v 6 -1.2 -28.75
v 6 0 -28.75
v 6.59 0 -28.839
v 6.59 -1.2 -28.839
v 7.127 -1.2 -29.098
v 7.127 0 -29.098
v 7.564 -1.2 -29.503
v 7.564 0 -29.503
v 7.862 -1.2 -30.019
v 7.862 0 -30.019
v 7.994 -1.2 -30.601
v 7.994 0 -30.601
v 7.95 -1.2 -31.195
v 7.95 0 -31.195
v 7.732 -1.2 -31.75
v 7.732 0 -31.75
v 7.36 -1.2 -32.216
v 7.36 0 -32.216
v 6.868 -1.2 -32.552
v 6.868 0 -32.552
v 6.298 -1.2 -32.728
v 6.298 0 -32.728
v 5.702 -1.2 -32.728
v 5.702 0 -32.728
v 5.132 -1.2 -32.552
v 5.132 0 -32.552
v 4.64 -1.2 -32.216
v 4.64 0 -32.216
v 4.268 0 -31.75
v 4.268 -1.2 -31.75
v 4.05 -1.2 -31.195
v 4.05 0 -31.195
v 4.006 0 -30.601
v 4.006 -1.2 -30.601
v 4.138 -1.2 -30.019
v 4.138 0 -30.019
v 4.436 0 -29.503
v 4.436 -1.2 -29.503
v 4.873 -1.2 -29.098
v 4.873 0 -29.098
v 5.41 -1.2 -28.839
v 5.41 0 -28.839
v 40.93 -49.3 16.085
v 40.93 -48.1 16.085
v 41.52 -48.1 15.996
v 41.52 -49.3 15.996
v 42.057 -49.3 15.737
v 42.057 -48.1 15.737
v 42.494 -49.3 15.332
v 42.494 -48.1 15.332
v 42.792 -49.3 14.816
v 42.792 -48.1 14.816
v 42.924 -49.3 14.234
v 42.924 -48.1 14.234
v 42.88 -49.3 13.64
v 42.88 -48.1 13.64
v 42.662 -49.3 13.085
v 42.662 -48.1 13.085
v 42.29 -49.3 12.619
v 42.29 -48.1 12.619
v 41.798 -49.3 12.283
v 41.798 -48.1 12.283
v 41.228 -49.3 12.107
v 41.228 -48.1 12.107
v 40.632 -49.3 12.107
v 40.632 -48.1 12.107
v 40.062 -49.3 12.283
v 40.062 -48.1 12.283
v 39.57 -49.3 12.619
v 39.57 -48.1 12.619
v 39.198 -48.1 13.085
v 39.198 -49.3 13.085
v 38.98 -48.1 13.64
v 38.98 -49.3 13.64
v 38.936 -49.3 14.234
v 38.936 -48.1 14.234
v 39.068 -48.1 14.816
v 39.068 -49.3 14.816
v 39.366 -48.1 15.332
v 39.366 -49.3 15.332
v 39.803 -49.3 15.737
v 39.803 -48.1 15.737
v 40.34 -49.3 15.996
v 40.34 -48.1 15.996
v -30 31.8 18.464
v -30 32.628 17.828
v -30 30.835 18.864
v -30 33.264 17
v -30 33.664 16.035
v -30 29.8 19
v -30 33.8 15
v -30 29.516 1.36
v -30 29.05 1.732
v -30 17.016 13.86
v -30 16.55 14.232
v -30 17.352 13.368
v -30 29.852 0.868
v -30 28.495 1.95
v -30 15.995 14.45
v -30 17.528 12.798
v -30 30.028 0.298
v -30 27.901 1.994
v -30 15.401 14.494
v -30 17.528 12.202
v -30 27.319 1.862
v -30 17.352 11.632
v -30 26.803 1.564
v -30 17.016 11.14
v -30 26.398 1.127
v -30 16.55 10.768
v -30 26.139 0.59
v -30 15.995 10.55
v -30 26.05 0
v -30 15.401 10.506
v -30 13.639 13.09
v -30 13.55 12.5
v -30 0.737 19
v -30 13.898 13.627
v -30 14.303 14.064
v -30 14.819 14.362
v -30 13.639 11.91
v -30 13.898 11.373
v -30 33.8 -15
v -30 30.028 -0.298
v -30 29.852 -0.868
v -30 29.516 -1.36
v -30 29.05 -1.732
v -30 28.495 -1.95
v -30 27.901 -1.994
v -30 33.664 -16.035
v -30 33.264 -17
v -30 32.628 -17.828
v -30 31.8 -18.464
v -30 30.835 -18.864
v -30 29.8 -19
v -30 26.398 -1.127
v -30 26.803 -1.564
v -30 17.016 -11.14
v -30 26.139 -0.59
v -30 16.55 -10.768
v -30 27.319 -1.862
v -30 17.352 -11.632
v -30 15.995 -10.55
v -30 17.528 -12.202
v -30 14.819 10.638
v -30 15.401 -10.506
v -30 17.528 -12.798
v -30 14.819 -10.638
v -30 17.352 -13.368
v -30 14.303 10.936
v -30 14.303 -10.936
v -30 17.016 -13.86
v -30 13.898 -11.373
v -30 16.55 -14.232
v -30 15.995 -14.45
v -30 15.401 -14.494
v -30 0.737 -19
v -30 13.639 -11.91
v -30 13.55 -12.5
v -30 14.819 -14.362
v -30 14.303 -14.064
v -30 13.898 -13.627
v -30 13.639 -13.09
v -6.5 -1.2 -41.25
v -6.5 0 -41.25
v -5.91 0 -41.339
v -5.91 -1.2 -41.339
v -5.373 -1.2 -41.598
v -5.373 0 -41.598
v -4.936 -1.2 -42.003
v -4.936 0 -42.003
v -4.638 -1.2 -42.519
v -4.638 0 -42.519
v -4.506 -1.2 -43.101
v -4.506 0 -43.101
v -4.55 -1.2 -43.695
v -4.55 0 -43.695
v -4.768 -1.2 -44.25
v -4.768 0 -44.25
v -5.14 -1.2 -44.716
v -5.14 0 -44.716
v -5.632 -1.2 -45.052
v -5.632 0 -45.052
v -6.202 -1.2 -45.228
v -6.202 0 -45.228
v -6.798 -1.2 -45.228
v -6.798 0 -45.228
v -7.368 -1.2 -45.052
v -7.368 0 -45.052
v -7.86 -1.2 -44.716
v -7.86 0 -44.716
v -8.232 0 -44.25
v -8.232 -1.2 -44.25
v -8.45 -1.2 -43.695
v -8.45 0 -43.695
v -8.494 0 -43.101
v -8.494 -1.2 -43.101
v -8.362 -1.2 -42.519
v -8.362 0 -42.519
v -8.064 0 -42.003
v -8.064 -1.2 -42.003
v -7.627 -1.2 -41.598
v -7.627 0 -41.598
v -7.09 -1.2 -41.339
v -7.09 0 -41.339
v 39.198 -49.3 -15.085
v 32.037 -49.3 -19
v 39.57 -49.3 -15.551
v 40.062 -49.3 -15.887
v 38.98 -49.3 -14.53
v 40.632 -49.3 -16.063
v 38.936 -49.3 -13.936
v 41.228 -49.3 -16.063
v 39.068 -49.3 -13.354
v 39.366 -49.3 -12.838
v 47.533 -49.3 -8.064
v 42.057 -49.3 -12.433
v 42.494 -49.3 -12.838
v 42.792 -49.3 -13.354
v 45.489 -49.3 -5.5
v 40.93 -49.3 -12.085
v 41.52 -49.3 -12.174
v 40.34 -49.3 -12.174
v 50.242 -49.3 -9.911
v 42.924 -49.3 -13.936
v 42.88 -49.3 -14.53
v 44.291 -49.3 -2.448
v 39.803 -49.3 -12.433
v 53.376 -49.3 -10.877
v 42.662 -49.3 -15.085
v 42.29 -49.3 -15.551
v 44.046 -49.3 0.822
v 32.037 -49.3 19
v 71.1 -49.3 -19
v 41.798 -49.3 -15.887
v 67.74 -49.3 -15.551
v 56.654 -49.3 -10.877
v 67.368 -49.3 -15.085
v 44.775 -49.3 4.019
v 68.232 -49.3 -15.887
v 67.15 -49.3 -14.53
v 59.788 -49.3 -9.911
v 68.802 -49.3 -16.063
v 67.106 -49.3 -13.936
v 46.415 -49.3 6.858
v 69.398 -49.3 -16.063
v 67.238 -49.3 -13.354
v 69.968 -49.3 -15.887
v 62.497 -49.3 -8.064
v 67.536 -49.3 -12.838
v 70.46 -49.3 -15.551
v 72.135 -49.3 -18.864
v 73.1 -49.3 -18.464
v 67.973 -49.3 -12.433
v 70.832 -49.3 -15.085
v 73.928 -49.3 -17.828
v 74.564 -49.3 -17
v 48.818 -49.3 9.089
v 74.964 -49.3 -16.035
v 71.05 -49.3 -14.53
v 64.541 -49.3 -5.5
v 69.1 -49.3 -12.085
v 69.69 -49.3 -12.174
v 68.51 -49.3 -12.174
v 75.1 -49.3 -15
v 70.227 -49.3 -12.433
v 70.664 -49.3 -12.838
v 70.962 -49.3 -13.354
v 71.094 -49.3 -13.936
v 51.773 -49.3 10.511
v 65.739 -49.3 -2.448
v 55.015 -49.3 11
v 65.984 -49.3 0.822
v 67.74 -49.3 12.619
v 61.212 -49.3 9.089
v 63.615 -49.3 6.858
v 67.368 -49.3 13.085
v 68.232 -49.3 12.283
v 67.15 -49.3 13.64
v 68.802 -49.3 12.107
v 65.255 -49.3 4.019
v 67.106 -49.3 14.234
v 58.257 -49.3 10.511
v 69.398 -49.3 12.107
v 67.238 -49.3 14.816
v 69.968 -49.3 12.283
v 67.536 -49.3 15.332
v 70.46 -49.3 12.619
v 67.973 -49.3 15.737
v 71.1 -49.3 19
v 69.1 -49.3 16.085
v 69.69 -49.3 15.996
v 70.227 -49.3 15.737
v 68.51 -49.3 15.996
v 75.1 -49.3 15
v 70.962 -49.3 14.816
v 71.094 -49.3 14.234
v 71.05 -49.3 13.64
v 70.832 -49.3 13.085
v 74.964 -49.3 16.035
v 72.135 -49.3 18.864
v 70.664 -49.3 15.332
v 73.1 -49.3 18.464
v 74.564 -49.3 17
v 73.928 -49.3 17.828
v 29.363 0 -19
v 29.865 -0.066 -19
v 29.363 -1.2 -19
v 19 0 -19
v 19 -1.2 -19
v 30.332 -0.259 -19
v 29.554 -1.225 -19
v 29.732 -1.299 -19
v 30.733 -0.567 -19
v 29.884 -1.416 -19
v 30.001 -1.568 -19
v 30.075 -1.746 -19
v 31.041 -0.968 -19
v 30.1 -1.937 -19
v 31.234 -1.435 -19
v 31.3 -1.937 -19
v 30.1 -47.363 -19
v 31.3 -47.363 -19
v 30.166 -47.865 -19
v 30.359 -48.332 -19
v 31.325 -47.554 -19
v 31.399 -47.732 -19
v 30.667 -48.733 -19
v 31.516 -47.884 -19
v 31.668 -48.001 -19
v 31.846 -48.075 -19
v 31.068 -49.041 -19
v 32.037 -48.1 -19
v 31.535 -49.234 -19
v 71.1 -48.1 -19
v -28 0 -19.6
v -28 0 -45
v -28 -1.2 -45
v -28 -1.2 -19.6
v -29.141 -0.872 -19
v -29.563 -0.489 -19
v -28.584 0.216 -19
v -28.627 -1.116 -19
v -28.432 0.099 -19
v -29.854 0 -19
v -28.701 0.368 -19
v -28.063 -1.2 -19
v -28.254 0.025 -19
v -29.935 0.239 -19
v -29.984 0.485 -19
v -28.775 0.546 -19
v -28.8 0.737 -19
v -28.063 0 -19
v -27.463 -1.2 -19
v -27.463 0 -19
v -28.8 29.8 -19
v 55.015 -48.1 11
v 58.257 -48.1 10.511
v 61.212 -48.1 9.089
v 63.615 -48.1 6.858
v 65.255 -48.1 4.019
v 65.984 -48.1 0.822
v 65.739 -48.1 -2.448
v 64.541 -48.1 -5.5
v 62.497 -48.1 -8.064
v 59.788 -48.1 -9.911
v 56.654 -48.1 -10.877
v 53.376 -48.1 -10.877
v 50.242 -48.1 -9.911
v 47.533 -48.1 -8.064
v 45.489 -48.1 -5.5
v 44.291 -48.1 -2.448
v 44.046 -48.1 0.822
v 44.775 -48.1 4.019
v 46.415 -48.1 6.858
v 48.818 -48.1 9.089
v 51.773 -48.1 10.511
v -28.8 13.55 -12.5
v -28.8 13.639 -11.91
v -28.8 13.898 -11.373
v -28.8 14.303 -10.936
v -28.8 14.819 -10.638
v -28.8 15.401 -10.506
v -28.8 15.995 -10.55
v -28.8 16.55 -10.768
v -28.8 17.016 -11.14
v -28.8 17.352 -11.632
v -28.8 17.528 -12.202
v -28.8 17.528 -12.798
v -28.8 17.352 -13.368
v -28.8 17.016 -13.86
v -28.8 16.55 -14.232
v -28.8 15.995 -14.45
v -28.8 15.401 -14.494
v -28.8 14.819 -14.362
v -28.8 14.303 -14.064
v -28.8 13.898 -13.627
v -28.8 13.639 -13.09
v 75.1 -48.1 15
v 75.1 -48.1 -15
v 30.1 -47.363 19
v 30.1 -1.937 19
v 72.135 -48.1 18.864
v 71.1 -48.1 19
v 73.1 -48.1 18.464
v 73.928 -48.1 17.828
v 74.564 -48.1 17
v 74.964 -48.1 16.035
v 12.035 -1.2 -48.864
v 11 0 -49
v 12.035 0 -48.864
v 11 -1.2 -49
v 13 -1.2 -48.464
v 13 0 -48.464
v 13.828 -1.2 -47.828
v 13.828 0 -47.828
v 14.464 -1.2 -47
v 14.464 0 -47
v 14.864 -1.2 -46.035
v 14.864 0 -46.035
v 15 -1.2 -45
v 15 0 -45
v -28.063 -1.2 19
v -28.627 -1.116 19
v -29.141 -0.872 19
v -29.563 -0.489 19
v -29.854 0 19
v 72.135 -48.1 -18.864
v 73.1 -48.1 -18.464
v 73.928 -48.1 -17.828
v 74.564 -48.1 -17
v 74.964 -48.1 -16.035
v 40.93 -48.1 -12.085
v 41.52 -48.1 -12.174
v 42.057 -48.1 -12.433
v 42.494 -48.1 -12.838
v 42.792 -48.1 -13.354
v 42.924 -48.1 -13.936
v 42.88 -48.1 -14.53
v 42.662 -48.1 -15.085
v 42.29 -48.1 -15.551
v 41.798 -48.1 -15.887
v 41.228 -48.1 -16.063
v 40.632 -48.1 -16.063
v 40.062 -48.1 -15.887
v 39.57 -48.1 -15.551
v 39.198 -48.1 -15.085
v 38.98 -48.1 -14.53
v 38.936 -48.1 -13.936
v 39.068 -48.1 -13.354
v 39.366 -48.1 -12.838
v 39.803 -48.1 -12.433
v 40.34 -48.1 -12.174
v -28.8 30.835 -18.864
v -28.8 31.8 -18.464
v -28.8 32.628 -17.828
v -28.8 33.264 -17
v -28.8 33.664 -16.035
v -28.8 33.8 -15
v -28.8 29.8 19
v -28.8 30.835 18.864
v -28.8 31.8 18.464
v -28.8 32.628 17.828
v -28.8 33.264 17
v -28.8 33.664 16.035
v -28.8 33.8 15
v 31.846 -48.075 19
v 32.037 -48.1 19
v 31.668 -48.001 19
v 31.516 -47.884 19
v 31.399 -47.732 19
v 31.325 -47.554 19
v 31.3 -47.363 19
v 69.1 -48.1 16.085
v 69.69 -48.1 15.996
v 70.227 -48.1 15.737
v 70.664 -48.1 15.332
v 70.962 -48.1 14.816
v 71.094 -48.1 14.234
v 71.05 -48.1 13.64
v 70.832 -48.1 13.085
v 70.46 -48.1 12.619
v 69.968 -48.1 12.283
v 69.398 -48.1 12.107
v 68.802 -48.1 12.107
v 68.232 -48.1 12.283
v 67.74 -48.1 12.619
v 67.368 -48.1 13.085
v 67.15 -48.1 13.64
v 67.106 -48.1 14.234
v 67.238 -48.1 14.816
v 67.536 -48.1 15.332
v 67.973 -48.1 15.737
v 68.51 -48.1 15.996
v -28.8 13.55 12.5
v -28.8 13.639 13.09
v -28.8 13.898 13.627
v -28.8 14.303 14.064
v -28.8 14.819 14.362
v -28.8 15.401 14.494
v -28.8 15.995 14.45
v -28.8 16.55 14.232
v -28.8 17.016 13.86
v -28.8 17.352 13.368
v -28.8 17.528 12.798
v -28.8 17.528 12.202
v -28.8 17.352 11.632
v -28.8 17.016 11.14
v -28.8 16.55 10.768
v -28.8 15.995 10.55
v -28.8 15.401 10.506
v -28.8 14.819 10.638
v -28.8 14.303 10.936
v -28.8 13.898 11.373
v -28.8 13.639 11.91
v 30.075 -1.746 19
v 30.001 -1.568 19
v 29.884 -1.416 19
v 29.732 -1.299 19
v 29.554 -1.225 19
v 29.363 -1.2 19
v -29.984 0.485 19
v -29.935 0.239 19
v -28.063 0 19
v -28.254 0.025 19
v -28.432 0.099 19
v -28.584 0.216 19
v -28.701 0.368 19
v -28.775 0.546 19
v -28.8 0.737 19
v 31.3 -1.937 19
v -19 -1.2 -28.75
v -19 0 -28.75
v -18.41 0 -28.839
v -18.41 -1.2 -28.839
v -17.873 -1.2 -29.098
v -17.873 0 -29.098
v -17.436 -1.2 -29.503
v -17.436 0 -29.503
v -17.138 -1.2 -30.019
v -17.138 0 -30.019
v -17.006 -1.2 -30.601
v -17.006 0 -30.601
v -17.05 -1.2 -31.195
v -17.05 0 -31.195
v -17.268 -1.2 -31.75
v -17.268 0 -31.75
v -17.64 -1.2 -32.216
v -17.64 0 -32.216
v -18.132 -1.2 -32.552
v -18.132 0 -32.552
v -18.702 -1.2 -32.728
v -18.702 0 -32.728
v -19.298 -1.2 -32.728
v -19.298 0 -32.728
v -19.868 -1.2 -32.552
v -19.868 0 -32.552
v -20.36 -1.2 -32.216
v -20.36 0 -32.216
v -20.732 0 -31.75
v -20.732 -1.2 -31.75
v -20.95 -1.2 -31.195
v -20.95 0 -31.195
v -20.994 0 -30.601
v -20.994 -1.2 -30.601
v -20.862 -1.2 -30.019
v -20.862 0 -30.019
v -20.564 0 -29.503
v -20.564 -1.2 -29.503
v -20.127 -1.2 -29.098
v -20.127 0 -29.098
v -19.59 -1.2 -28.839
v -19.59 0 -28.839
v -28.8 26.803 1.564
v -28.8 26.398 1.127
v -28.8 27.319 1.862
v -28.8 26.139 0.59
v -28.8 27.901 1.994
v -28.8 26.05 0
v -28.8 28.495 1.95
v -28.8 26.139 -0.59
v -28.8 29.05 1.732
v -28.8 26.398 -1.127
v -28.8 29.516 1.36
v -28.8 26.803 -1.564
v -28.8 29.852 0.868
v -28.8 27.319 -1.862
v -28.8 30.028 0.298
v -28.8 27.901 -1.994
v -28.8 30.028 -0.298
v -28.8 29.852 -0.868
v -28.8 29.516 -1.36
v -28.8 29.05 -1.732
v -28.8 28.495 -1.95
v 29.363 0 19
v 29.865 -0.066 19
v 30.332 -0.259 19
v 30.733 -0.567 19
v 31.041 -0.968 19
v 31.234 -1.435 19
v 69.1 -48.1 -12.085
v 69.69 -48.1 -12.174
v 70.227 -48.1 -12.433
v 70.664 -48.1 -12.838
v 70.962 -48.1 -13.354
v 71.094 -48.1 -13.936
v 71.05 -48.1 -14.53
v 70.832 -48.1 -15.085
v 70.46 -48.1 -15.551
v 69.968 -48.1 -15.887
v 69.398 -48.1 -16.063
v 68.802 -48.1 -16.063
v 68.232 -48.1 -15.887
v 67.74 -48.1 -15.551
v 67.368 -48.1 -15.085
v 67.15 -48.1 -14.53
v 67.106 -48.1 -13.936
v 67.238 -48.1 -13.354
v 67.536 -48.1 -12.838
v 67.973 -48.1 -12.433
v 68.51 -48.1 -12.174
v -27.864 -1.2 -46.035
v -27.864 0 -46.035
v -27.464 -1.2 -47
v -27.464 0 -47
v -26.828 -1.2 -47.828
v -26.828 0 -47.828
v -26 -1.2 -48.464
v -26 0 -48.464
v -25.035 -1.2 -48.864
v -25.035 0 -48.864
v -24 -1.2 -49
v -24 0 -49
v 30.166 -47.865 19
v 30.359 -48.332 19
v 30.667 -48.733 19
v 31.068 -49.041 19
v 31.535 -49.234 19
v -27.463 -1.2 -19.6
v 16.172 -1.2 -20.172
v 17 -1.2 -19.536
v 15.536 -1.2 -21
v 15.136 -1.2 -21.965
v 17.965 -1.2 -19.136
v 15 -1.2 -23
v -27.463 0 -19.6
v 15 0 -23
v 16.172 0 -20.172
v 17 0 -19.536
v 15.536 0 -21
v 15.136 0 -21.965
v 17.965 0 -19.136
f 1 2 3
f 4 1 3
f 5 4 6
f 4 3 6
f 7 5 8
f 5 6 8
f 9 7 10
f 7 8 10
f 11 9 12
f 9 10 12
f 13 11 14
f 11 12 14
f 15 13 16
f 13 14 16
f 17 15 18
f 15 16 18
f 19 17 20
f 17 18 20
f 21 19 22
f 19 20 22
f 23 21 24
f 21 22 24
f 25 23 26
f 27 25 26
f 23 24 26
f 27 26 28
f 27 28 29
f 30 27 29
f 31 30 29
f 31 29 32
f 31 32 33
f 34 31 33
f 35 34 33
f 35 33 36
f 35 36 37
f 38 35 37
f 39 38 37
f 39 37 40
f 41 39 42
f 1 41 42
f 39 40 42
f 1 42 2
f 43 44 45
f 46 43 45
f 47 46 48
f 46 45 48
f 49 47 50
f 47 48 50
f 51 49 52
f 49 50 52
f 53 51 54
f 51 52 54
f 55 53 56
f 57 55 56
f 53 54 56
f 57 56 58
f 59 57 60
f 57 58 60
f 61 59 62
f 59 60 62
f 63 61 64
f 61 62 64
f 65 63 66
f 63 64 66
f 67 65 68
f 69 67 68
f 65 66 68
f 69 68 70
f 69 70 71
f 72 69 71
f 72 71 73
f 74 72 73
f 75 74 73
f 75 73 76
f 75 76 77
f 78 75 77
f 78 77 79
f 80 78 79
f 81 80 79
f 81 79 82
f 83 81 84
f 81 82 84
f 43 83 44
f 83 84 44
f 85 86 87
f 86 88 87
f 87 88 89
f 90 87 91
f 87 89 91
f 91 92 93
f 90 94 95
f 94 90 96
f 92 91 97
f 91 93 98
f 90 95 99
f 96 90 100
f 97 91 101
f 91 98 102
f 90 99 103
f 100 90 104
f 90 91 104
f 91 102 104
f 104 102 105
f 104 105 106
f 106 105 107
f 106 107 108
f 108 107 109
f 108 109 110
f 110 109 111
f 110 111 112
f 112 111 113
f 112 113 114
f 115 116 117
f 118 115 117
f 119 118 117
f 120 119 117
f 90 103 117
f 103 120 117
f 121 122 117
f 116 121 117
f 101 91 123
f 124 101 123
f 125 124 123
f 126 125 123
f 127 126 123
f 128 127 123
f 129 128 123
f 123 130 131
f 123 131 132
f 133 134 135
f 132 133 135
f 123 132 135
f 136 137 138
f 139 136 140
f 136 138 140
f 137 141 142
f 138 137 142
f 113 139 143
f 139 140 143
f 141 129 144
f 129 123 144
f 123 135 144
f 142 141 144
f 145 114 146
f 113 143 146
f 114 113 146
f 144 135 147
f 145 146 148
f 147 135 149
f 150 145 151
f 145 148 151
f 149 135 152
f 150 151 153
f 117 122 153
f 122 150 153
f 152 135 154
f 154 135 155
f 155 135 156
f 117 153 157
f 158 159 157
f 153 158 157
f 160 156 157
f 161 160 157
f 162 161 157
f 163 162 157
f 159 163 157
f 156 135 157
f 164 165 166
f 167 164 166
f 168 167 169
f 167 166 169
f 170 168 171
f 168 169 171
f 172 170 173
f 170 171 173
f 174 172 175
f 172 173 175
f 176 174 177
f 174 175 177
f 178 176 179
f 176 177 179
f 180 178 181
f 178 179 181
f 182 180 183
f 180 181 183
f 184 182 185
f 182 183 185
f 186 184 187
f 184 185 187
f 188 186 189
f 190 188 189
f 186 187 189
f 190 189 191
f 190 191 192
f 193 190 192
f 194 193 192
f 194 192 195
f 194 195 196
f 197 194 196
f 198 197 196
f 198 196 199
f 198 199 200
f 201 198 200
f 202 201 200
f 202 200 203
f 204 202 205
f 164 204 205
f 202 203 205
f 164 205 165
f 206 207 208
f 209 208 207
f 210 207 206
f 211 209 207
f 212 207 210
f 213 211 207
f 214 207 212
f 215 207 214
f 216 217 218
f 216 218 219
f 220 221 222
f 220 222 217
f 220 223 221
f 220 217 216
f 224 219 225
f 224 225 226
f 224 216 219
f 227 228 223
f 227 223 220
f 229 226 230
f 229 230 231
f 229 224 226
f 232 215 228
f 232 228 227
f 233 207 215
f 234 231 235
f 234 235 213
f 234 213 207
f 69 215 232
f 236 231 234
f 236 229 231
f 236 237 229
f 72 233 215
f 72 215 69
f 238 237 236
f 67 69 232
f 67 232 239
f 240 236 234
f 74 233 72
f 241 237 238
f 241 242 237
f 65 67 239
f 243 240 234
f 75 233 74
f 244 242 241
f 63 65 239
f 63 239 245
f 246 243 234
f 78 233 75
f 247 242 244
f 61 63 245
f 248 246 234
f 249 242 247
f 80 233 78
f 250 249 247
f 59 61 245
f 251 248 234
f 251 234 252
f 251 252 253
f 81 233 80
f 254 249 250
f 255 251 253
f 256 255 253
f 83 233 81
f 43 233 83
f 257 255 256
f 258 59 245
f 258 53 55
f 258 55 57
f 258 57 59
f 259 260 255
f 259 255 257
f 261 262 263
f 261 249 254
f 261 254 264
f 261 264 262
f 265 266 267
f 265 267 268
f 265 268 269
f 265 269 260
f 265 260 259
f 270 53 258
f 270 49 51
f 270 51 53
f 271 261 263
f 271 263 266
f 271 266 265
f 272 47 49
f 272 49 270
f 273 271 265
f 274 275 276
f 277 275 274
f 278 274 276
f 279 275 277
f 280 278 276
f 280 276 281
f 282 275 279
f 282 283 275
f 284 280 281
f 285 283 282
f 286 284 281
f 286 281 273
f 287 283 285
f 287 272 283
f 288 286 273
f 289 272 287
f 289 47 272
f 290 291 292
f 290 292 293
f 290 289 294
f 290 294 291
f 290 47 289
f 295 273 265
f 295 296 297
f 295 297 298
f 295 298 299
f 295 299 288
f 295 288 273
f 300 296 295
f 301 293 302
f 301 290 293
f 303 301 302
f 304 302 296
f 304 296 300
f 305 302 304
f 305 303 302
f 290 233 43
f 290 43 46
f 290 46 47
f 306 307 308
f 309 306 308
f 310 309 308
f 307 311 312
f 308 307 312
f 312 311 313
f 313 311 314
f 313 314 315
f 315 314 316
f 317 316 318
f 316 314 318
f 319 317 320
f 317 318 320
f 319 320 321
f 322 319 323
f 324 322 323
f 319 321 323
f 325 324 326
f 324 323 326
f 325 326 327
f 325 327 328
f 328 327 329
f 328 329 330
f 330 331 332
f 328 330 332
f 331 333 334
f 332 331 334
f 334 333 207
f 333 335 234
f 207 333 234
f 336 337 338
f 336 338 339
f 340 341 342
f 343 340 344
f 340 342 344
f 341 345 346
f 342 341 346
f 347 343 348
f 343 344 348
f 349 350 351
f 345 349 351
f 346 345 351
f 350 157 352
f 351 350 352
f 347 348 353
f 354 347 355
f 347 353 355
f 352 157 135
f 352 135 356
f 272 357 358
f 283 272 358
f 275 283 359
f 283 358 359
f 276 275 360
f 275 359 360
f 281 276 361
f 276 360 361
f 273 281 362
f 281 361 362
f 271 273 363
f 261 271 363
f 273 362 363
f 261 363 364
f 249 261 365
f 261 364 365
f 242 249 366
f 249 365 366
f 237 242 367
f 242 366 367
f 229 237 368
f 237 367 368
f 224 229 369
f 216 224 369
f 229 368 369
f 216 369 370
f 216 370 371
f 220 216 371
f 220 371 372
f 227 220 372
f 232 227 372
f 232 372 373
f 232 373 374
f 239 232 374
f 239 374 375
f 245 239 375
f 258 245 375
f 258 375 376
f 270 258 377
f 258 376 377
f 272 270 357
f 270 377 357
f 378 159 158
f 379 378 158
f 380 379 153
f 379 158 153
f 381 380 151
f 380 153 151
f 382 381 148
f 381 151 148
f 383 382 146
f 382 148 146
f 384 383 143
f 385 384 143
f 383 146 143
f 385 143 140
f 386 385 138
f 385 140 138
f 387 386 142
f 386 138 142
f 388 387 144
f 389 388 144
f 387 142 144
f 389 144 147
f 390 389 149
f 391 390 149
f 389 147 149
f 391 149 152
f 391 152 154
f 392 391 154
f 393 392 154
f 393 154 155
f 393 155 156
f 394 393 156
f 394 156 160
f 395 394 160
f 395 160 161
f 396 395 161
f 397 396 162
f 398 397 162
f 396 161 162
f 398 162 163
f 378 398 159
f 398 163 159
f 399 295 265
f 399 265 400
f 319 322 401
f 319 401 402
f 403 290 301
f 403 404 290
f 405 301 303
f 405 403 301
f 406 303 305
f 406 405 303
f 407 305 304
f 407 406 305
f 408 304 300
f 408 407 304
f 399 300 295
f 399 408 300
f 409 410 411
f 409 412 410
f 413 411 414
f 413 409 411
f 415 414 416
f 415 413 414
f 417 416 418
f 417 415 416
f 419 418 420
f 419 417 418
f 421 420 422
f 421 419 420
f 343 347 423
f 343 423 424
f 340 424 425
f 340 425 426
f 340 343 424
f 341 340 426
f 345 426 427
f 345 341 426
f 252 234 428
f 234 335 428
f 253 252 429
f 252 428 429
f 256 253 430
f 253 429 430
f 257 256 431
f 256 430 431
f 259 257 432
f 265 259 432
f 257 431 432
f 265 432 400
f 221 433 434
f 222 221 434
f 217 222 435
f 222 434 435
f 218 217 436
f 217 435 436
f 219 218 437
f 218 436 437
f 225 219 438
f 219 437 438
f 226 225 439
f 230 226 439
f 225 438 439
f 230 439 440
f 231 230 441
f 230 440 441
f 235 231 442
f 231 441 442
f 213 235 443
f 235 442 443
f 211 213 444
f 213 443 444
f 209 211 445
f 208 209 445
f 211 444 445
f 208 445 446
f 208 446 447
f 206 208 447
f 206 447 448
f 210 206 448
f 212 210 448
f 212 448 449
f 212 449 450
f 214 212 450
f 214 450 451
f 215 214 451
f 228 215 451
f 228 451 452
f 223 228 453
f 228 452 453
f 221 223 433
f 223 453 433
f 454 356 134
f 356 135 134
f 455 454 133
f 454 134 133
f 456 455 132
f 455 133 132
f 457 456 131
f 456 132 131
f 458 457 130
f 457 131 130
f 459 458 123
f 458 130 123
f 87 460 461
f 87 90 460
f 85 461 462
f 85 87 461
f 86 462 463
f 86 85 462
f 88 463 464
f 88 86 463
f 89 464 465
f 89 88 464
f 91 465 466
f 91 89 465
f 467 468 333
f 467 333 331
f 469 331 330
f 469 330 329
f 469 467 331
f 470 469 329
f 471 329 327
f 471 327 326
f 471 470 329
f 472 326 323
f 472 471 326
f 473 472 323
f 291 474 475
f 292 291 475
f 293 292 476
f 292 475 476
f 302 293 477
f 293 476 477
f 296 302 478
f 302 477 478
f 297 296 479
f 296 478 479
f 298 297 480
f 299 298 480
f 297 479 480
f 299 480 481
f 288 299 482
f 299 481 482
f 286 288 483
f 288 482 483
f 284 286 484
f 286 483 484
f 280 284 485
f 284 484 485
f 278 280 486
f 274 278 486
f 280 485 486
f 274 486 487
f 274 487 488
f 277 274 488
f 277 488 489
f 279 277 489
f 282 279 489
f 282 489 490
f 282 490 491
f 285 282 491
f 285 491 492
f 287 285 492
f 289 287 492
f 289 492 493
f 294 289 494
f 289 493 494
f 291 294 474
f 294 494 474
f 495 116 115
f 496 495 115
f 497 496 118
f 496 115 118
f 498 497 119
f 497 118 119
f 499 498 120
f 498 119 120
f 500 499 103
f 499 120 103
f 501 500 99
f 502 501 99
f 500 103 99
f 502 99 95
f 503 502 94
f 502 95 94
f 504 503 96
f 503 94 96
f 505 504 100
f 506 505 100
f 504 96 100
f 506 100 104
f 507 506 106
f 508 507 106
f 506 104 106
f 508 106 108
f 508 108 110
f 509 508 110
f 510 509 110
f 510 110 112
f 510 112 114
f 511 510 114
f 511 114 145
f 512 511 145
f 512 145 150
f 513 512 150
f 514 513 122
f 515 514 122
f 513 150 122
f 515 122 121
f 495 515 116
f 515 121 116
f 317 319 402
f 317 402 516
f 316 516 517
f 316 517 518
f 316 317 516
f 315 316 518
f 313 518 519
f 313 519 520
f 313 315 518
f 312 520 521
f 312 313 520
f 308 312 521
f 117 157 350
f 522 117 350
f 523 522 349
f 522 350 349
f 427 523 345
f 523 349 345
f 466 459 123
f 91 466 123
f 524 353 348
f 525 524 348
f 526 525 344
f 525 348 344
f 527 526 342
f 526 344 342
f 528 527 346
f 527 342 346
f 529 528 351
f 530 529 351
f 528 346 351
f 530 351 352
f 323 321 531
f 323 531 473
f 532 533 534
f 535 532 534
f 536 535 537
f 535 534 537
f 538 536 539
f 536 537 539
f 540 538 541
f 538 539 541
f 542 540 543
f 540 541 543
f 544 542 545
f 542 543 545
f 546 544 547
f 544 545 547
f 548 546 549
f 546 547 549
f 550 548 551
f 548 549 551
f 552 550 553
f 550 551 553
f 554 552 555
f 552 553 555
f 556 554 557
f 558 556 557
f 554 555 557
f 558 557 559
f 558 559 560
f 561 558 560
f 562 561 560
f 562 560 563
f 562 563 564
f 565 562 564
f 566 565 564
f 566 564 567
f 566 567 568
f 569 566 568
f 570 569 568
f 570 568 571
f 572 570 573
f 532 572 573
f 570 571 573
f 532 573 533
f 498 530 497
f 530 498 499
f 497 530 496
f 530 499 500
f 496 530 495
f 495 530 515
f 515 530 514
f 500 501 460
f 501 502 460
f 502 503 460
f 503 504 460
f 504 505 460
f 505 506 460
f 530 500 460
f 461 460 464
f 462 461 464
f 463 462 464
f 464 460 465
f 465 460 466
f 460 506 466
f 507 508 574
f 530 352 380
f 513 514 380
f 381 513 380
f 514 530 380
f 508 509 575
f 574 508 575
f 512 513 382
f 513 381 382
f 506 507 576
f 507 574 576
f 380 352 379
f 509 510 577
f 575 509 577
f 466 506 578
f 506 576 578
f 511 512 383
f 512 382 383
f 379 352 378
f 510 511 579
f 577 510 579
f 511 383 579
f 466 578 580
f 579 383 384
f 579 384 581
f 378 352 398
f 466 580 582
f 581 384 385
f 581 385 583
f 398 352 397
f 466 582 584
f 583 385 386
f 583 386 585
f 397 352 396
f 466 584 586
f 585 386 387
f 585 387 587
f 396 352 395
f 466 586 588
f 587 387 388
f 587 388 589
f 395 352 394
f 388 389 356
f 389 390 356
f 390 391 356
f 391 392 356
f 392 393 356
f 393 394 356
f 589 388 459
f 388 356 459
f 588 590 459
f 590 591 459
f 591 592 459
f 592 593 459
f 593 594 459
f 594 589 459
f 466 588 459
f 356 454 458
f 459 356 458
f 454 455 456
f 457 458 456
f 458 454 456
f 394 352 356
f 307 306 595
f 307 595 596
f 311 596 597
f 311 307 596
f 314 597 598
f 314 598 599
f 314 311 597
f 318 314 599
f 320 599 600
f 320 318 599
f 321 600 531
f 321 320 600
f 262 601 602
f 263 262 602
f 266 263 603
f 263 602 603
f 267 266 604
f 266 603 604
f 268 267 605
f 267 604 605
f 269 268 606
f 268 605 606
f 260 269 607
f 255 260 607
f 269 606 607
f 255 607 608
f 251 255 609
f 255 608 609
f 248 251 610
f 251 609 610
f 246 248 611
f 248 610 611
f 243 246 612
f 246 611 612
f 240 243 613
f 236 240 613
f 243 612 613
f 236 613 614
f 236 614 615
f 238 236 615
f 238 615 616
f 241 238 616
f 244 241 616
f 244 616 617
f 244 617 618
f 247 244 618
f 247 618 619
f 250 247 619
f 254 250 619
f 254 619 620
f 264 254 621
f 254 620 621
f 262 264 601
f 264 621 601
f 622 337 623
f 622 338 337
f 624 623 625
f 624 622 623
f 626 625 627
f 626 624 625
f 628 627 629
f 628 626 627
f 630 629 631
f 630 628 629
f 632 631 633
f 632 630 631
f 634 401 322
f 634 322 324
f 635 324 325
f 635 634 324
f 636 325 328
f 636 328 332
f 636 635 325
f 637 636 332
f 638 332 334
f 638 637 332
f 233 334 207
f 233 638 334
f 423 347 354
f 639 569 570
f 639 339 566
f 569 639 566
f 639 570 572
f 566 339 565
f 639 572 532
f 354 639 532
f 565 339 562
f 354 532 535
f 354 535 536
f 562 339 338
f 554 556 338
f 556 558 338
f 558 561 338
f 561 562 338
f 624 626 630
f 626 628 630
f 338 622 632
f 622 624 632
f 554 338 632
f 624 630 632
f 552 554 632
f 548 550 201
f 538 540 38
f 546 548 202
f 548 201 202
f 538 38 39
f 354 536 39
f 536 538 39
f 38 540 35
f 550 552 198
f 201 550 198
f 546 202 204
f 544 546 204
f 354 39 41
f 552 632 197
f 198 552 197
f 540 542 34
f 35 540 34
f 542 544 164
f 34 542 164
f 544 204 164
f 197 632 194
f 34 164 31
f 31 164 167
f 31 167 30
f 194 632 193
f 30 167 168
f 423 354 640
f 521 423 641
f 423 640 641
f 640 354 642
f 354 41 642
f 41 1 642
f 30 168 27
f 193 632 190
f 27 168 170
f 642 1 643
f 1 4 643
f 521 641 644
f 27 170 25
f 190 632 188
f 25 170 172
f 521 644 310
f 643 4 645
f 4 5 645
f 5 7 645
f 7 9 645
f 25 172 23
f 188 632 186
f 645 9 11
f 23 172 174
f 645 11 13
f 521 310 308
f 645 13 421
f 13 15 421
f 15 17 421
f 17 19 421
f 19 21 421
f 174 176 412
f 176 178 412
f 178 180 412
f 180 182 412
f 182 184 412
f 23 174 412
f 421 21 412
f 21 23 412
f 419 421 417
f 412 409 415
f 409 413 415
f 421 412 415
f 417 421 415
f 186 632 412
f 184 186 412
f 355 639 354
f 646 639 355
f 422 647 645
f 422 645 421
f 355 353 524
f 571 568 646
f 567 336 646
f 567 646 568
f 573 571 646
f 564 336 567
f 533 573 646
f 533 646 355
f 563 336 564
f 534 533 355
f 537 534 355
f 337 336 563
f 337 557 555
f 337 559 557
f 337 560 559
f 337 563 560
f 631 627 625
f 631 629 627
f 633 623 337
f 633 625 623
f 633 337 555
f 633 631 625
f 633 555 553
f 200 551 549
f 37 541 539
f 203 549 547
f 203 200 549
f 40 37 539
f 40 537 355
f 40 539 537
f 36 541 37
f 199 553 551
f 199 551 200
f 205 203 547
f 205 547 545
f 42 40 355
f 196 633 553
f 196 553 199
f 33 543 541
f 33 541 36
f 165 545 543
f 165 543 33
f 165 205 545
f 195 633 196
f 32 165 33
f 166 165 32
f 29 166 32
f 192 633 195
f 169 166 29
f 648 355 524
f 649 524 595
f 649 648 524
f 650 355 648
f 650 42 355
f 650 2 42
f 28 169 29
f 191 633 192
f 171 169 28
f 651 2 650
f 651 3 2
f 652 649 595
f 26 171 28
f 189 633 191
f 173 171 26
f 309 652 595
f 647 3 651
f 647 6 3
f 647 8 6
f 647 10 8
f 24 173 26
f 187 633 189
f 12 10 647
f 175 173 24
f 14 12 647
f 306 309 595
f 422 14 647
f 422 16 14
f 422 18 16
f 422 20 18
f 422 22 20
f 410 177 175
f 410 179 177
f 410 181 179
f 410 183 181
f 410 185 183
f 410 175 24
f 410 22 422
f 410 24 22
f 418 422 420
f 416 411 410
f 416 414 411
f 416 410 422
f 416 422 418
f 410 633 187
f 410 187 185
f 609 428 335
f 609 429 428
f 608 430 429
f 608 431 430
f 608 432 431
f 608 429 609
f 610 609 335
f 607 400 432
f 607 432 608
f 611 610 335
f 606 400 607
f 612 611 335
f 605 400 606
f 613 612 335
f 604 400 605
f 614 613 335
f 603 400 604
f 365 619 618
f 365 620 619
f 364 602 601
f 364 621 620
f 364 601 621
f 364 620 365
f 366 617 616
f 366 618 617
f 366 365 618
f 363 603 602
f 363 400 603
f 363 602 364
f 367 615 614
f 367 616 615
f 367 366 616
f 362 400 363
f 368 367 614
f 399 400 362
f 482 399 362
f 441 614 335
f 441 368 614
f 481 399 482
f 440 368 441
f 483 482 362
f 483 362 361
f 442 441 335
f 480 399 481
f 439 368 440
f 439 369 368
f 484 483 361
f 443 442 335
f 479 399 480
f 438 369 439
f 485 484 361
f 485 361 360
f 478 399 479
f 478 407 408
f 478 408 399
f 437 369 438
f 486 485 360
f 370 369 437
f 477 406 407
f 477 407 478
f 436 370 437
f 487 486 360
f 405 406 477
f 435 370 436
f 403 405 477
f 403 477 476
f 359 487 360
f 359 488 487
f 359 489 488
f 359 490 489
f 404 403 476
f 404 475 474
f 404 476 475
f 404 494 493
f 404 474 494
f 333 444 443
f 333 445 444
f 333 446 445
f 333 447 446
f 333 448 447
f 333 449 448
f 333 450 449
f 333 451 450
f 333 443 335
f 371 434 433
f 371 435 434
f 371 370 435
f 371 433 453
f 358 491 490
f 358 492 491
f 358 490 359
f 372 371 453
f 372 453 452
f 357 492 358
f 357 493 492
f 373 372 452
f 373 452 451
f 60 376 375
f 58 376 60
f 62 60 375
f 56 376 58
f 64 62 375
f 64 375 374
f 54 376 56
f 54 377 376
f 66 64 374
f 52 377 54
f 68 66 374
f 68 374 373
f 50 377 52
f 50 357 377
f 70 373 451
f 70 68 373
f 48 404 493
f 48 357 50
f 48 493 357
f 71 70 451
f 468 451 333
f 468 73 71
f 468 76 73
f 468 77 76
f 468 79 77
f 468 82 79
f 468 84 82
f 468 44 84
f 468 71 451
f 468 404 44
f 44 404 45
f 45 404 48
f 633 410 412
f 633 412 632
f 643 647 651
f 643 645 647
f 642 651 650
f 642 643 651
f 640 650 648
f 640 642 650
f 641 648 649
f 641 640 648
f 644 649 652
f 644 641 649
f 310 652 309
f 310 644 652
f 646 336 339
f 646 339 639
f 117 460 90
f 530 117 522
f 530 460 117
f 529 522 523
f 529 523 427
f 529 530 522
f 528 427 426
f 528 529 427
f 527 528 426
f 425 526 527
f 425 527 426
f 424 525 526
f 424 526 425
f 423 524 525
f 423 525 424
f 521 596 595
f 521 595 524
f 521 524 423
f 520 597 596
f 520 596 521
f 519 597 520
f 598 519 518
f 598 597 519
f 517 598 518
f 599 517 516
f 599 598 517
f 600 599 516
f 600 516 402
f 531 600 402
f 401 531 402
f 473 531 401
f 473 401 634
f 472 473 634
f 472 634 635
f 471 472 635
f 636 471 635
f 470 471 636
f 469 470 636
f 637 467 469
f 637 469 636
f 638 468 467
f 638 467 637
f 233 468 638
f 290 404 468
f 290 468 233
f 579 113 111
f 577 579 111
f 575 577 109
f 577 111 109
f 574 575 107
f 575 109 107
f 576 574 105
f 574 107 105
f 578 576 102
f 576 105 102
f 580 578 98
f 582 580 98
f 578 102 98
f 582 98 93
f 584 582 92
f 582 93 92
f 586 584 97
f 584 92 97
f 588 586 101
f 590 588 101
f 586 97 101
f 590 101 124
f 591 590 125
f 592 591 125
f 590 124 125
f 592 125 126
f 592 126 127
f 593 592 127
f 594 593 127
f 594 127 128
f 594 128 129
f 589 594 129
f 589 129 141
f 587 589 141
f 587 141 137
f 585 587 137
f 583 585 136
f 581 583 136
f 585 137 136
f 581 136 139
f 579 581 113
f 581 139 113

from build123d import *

# Parameters (mm, degrees)
BRIDA_BASE1_DEPTH                = 1.2
BRIDA_START                      = -19
BRIDA_DE_ARISTA1_DEPTH           = 38
BRIDA_START_2                    = -19.6
BRIDA_DE_ARISTA1_2_OUTLINE_W     = 0.5366
BRIDA_DE_ARISTA1_2_OUTLINE_H     = 1.2
BRIDA_DE_ARISTA1_2_DEPTH         = 0.6
BRIDA_DE_ARISTA1_3_DEPTH         = 38
CROQUIS12_R                      = 2
CORTAR_EXTRUIR1_DEPTH            = 1.2
CROQUIS15_R                      = 2
CORTAR_EXTRUIR3_DEPTH            = 1.2
REDONDEO3_R                      = 4
BRIDA_DE_ARISTA2_STRIP_W         = 6.3732
BRIDA_DE_ARISTA2_STRIP_H         = 1.2
BRIDA_DE_ARISTA2_STRIP_CUT_DEPTH = 38
BRIDA_DE_ARISTA2_DEPTH           = 38
BRIDA_DE_ARISTA3_STRIP_W         = 6.3732
BRIDA_DE_ARISTA3_STRIP_H         = 1.2
BRIDA_DE_ARISTA3_STRIP_CUT_DEPTH = 38
BRIDA_DE_ARISTA3_DEPTH           = 38
CROQUIS22_R                      = 2
CROQUIS22_R_2                    = 11
CORTAR_EXTRUIR4_DEPTH            = 1.2
REDONDEO4_R                      = 4


# Read off the part's stored shape, not the designer's step: Brida de arista1
# Sheet-metal steps are written as plain solids
with BuildPart() as part:
    # Croquis1 → Brida base1 (new body)
    with BuildSketch(Plane(origin=(0, 0, 0), x_dir=(1, 0, 0), z_dir=(0, 1, 0))):
        Polygon((-30, -19), (30, -19), (30, 19), (15, 19), (15, 49), (-28, 49), (-28, 19), (-30, 19), align=None)
    extrude(amount=-BRIDA_BASE1_DEPTH)

    # Brida de arista1 outline → Brida de arista1 (cut)
    with BuildSketch(Plane.XY.offset(BRIDA_START)):
        with BuildLine():
            Line((-30, -1.2), (-28.0634, -1.2))
            ThreePointArc((-28.0634, -1.2), (-29.141342484, -0.872269031), (-29.854444388, 0))
            Line((-29.854444388, 0), (-30, 0))
            Line((-30, 0), (-30, -1.2))
        make_face()
    extrude(amount=BRIDA_DE_ARISTA1_DEPTH, mode=Mode.SUBTRACT)

    # Brida de arista1 2 outline → Brida de arista1 2 (cut)
    with BuildSketch(Plane.XY.offset(BRIDA_START_2)):
        with Locations((-27.7317, -0.6)):
            Rectangle(BRIDA_DE_ARISTA1_2_OUTLINE_W, BRIDA_DE_ARISTA1_2_OUTLINE_H)
    extrude(amount=BRIDA_DE_ARISTA1_2_DEPTH, mode=Mode.SUBTRACT)

    # Brida de arista1 3 outline → Brida de arista1 3 (add)
    with BuildSketch(Plane.XY.offset(BRIDA_START)):
        with BuildLine():
            Line((-29.854444388, 0), (-28.0634, 0))
            ThreePointArc((-28.0634, 0), (-28.584254855, 0.215745145), (-28.8, 0.7366))
            Line((-28.8, 0.7366), (-28.8, 33.8))
            Line((-28.8, 33.8), (-30, 33.8))
            Line((-30, 33.8), (-30, 0.7366))
            ThreePointArc((-30, 0.7366), (-29.963262642, 0.361178238), (-29.854444388, 0))
        make_face()
    extrude(amount=BRIDA_DE_ARISTA1_3_DEPTH)

    # Croquis12 → Cortar-Extruir1 (cut)
    with BuildSketch(Plane(origin=(0, 0, 0), x_dir=(1, 0, 0), z_dir=(0, 1, 0))):
        with Locations(Location((6, 30.75, 0), (0, 0, 270))):
            Circle(CROQUIS12_R)
        with Locations(Location((-19, 30.75, 0), (0, 0, 270))):
            Circle(CROQUIS12_R)
        with Locations(Location((-6.5, 43.25, 0), (0, 0, 270))):
            Circle(CROQUIS12_R)
    extrude(amount=-CORTAR_EXTRUIR1_DEPTH, mode=Mode.SUBTRACT)

    # Croquis15 → Cortar-Extruir3 (cut)
    with BuildSketch(Plane.ZY.offset(30)):
        with Locations(Location((-12.5, 15.55, 0), (0, 0, 270))):
            Circle(CROQUIS15_R)
        with Locations(Location((12.5, 15.55, 0), (0, 0, 270))):
            Circle(CROQUIS15_R)
        with Locations(Location((0, 28.05, 0), (0, 0, 270))):
            Circle(CROQUIS15_R)
    extrude(amount=-CORTAR_EXTRUIR3_DEPTH, mode=Mode.SUBTRACT)

    # Redondeo3
    redondeo3_edges = [part.edges().sort_by_distance(p)[0] for p in [
        (-28, -0.6, -49),
        (15, -0.6, -49),
        (15, -0.6, -19),
        (-29.4, 33.8, -19),
        (-29.4, 33.8, 19),
    ]]
    fillet(redondeo3_edges, radius=REDONDEO3_R)

    # Brida de arista2 strip (across the edge) → Brida de arista2 strip cut (cut)
    with BuildSketch(Plane(origin=(30.1, -1.2, -19), x_dir=(-1, 0, 0), z_dir=(0, 0, 1))):
        with Locations((-2.45, -0.6)):
            Rectangle(BRIDA_DE_ARISTA2_STRIP_W, BRIDA_DE_ARISTA2_STRIP_H)
    extrude(amount=BRIDA_DE_ARISTA2_STRIP_CUT_DEPTH, mode=Mode.SUBTRACT)

    # Brida de arista2 section (across the edge) → Brida de arista2 (add)
    with BuildSketch(Plane(origin=(30.1, -1.2, -19), x_dir=(-1, 0, 0), z_dir=(0, 0, 1))):
        with BuildLine():
            Line((-1.2, 0.7366), (-1.2, 46.8))
            Line((-1.2, 46.8), (0, 46.8))
            Line((0, 46.8), (0, 0.7366))
            ThreePointArc((0, 0.7366), (0.215745145, 0.215745145), (0.7366, 0))
            Line((0.7366, 0), (0.7366, -1.2))
            ThreePointArc((0.7366, -1.2), (-0.632782992, -0.632782992), (-1.2, 0.7366))
        make_face()
    extrude(amount=BRIDA_DE_ARISTA2_DEPTH)

    # Brida de arista3 strip (across the edge) → Brida de arista3 strip cut (cut)
    with BuildSketch(Plane(origin=(31.3, -48.1, 19), x_dir=(0, 1, 0), z_dir=(0, 0, -1))):
        with Locations((-2.45, -0.6)):
            Rectangle(BRIDA_DE_ARISTA3_STRIP_W, BRIDA_DE_ARISTA3_STRIP_H)
    extrude(amount=BRIDA_DE_ARISTA3_STRIP_CUT_DEPTH, mode=Mode.SUBTRACT)

    # Brida de arista3 section (across the edge) → Brida de arista3 (add)
    with BuildSketch(Plane(origin=(31.3, -48.1, 19), x_dir=(0, 1, 0), z_dir=(0, 0, -1))):
        with BuildLine():
            Line((-1.2, 0.7366), (-1.2, 43.8))
            Line((-1.2, 43.8), (0, 43.8))
            Line((0, 43.8), (0, 0.7366))
            ThreePointArc((0, 0.7366), (0.215745145, 0.215745145), (0.7366, 0))
            Line((0.7366, 0), (0.7366, -1.2))
            ThreePointArc((0.7366, -1.2), (-0.632782992, -0.632782992), (-1.2, 0.7366))
        make_face()
    extrude(amount=BRIDA_DE_ARISTA3_DEPTH)

    # Croquis22 → Cortar-Extruir4 (cut)
    with BuildSketch(Plane(origin=(0, -48.1, 0), x_dir=(1, 0, 0), z_dir=(0, 1, 0))):
        with Locations(Location((69.1, -14.085, 0), (0, 0, 270))):
            Circle(CROQUIS22_R)
        with Locations(Location((40.93, -14.085, 0), (0, 0, 270))):
            Circle(CROQUIS22_R)
        with Locations(Location((69.1, 14.085, 0), (0, 0, 270))):
            Circle(CROQUIS22_R)
        with Locations(Location((40.93, 14.085, 0), (0, 0, 270))):
            Circle(CROQUIS22_R)
        with Locations(Location((55.015, 0, 0), (0, 0, 270))):
            Circle(CROQUIS22_R_2)
    extrude(amount=-CORTAR_EXTRUIR4_DEPTH, mode=Mode.SUBTRACT)

    # Redondeo4
    redondeo4_edges = [part.edges().sort_by_distance(p)[0] for p in [
        (75.1, -48.7, 19),
        (75.1, -48.7, -19),
    ]]
    fillet(redondeo4_edges, radius=REDONDEO4_R)


solid = part.part
